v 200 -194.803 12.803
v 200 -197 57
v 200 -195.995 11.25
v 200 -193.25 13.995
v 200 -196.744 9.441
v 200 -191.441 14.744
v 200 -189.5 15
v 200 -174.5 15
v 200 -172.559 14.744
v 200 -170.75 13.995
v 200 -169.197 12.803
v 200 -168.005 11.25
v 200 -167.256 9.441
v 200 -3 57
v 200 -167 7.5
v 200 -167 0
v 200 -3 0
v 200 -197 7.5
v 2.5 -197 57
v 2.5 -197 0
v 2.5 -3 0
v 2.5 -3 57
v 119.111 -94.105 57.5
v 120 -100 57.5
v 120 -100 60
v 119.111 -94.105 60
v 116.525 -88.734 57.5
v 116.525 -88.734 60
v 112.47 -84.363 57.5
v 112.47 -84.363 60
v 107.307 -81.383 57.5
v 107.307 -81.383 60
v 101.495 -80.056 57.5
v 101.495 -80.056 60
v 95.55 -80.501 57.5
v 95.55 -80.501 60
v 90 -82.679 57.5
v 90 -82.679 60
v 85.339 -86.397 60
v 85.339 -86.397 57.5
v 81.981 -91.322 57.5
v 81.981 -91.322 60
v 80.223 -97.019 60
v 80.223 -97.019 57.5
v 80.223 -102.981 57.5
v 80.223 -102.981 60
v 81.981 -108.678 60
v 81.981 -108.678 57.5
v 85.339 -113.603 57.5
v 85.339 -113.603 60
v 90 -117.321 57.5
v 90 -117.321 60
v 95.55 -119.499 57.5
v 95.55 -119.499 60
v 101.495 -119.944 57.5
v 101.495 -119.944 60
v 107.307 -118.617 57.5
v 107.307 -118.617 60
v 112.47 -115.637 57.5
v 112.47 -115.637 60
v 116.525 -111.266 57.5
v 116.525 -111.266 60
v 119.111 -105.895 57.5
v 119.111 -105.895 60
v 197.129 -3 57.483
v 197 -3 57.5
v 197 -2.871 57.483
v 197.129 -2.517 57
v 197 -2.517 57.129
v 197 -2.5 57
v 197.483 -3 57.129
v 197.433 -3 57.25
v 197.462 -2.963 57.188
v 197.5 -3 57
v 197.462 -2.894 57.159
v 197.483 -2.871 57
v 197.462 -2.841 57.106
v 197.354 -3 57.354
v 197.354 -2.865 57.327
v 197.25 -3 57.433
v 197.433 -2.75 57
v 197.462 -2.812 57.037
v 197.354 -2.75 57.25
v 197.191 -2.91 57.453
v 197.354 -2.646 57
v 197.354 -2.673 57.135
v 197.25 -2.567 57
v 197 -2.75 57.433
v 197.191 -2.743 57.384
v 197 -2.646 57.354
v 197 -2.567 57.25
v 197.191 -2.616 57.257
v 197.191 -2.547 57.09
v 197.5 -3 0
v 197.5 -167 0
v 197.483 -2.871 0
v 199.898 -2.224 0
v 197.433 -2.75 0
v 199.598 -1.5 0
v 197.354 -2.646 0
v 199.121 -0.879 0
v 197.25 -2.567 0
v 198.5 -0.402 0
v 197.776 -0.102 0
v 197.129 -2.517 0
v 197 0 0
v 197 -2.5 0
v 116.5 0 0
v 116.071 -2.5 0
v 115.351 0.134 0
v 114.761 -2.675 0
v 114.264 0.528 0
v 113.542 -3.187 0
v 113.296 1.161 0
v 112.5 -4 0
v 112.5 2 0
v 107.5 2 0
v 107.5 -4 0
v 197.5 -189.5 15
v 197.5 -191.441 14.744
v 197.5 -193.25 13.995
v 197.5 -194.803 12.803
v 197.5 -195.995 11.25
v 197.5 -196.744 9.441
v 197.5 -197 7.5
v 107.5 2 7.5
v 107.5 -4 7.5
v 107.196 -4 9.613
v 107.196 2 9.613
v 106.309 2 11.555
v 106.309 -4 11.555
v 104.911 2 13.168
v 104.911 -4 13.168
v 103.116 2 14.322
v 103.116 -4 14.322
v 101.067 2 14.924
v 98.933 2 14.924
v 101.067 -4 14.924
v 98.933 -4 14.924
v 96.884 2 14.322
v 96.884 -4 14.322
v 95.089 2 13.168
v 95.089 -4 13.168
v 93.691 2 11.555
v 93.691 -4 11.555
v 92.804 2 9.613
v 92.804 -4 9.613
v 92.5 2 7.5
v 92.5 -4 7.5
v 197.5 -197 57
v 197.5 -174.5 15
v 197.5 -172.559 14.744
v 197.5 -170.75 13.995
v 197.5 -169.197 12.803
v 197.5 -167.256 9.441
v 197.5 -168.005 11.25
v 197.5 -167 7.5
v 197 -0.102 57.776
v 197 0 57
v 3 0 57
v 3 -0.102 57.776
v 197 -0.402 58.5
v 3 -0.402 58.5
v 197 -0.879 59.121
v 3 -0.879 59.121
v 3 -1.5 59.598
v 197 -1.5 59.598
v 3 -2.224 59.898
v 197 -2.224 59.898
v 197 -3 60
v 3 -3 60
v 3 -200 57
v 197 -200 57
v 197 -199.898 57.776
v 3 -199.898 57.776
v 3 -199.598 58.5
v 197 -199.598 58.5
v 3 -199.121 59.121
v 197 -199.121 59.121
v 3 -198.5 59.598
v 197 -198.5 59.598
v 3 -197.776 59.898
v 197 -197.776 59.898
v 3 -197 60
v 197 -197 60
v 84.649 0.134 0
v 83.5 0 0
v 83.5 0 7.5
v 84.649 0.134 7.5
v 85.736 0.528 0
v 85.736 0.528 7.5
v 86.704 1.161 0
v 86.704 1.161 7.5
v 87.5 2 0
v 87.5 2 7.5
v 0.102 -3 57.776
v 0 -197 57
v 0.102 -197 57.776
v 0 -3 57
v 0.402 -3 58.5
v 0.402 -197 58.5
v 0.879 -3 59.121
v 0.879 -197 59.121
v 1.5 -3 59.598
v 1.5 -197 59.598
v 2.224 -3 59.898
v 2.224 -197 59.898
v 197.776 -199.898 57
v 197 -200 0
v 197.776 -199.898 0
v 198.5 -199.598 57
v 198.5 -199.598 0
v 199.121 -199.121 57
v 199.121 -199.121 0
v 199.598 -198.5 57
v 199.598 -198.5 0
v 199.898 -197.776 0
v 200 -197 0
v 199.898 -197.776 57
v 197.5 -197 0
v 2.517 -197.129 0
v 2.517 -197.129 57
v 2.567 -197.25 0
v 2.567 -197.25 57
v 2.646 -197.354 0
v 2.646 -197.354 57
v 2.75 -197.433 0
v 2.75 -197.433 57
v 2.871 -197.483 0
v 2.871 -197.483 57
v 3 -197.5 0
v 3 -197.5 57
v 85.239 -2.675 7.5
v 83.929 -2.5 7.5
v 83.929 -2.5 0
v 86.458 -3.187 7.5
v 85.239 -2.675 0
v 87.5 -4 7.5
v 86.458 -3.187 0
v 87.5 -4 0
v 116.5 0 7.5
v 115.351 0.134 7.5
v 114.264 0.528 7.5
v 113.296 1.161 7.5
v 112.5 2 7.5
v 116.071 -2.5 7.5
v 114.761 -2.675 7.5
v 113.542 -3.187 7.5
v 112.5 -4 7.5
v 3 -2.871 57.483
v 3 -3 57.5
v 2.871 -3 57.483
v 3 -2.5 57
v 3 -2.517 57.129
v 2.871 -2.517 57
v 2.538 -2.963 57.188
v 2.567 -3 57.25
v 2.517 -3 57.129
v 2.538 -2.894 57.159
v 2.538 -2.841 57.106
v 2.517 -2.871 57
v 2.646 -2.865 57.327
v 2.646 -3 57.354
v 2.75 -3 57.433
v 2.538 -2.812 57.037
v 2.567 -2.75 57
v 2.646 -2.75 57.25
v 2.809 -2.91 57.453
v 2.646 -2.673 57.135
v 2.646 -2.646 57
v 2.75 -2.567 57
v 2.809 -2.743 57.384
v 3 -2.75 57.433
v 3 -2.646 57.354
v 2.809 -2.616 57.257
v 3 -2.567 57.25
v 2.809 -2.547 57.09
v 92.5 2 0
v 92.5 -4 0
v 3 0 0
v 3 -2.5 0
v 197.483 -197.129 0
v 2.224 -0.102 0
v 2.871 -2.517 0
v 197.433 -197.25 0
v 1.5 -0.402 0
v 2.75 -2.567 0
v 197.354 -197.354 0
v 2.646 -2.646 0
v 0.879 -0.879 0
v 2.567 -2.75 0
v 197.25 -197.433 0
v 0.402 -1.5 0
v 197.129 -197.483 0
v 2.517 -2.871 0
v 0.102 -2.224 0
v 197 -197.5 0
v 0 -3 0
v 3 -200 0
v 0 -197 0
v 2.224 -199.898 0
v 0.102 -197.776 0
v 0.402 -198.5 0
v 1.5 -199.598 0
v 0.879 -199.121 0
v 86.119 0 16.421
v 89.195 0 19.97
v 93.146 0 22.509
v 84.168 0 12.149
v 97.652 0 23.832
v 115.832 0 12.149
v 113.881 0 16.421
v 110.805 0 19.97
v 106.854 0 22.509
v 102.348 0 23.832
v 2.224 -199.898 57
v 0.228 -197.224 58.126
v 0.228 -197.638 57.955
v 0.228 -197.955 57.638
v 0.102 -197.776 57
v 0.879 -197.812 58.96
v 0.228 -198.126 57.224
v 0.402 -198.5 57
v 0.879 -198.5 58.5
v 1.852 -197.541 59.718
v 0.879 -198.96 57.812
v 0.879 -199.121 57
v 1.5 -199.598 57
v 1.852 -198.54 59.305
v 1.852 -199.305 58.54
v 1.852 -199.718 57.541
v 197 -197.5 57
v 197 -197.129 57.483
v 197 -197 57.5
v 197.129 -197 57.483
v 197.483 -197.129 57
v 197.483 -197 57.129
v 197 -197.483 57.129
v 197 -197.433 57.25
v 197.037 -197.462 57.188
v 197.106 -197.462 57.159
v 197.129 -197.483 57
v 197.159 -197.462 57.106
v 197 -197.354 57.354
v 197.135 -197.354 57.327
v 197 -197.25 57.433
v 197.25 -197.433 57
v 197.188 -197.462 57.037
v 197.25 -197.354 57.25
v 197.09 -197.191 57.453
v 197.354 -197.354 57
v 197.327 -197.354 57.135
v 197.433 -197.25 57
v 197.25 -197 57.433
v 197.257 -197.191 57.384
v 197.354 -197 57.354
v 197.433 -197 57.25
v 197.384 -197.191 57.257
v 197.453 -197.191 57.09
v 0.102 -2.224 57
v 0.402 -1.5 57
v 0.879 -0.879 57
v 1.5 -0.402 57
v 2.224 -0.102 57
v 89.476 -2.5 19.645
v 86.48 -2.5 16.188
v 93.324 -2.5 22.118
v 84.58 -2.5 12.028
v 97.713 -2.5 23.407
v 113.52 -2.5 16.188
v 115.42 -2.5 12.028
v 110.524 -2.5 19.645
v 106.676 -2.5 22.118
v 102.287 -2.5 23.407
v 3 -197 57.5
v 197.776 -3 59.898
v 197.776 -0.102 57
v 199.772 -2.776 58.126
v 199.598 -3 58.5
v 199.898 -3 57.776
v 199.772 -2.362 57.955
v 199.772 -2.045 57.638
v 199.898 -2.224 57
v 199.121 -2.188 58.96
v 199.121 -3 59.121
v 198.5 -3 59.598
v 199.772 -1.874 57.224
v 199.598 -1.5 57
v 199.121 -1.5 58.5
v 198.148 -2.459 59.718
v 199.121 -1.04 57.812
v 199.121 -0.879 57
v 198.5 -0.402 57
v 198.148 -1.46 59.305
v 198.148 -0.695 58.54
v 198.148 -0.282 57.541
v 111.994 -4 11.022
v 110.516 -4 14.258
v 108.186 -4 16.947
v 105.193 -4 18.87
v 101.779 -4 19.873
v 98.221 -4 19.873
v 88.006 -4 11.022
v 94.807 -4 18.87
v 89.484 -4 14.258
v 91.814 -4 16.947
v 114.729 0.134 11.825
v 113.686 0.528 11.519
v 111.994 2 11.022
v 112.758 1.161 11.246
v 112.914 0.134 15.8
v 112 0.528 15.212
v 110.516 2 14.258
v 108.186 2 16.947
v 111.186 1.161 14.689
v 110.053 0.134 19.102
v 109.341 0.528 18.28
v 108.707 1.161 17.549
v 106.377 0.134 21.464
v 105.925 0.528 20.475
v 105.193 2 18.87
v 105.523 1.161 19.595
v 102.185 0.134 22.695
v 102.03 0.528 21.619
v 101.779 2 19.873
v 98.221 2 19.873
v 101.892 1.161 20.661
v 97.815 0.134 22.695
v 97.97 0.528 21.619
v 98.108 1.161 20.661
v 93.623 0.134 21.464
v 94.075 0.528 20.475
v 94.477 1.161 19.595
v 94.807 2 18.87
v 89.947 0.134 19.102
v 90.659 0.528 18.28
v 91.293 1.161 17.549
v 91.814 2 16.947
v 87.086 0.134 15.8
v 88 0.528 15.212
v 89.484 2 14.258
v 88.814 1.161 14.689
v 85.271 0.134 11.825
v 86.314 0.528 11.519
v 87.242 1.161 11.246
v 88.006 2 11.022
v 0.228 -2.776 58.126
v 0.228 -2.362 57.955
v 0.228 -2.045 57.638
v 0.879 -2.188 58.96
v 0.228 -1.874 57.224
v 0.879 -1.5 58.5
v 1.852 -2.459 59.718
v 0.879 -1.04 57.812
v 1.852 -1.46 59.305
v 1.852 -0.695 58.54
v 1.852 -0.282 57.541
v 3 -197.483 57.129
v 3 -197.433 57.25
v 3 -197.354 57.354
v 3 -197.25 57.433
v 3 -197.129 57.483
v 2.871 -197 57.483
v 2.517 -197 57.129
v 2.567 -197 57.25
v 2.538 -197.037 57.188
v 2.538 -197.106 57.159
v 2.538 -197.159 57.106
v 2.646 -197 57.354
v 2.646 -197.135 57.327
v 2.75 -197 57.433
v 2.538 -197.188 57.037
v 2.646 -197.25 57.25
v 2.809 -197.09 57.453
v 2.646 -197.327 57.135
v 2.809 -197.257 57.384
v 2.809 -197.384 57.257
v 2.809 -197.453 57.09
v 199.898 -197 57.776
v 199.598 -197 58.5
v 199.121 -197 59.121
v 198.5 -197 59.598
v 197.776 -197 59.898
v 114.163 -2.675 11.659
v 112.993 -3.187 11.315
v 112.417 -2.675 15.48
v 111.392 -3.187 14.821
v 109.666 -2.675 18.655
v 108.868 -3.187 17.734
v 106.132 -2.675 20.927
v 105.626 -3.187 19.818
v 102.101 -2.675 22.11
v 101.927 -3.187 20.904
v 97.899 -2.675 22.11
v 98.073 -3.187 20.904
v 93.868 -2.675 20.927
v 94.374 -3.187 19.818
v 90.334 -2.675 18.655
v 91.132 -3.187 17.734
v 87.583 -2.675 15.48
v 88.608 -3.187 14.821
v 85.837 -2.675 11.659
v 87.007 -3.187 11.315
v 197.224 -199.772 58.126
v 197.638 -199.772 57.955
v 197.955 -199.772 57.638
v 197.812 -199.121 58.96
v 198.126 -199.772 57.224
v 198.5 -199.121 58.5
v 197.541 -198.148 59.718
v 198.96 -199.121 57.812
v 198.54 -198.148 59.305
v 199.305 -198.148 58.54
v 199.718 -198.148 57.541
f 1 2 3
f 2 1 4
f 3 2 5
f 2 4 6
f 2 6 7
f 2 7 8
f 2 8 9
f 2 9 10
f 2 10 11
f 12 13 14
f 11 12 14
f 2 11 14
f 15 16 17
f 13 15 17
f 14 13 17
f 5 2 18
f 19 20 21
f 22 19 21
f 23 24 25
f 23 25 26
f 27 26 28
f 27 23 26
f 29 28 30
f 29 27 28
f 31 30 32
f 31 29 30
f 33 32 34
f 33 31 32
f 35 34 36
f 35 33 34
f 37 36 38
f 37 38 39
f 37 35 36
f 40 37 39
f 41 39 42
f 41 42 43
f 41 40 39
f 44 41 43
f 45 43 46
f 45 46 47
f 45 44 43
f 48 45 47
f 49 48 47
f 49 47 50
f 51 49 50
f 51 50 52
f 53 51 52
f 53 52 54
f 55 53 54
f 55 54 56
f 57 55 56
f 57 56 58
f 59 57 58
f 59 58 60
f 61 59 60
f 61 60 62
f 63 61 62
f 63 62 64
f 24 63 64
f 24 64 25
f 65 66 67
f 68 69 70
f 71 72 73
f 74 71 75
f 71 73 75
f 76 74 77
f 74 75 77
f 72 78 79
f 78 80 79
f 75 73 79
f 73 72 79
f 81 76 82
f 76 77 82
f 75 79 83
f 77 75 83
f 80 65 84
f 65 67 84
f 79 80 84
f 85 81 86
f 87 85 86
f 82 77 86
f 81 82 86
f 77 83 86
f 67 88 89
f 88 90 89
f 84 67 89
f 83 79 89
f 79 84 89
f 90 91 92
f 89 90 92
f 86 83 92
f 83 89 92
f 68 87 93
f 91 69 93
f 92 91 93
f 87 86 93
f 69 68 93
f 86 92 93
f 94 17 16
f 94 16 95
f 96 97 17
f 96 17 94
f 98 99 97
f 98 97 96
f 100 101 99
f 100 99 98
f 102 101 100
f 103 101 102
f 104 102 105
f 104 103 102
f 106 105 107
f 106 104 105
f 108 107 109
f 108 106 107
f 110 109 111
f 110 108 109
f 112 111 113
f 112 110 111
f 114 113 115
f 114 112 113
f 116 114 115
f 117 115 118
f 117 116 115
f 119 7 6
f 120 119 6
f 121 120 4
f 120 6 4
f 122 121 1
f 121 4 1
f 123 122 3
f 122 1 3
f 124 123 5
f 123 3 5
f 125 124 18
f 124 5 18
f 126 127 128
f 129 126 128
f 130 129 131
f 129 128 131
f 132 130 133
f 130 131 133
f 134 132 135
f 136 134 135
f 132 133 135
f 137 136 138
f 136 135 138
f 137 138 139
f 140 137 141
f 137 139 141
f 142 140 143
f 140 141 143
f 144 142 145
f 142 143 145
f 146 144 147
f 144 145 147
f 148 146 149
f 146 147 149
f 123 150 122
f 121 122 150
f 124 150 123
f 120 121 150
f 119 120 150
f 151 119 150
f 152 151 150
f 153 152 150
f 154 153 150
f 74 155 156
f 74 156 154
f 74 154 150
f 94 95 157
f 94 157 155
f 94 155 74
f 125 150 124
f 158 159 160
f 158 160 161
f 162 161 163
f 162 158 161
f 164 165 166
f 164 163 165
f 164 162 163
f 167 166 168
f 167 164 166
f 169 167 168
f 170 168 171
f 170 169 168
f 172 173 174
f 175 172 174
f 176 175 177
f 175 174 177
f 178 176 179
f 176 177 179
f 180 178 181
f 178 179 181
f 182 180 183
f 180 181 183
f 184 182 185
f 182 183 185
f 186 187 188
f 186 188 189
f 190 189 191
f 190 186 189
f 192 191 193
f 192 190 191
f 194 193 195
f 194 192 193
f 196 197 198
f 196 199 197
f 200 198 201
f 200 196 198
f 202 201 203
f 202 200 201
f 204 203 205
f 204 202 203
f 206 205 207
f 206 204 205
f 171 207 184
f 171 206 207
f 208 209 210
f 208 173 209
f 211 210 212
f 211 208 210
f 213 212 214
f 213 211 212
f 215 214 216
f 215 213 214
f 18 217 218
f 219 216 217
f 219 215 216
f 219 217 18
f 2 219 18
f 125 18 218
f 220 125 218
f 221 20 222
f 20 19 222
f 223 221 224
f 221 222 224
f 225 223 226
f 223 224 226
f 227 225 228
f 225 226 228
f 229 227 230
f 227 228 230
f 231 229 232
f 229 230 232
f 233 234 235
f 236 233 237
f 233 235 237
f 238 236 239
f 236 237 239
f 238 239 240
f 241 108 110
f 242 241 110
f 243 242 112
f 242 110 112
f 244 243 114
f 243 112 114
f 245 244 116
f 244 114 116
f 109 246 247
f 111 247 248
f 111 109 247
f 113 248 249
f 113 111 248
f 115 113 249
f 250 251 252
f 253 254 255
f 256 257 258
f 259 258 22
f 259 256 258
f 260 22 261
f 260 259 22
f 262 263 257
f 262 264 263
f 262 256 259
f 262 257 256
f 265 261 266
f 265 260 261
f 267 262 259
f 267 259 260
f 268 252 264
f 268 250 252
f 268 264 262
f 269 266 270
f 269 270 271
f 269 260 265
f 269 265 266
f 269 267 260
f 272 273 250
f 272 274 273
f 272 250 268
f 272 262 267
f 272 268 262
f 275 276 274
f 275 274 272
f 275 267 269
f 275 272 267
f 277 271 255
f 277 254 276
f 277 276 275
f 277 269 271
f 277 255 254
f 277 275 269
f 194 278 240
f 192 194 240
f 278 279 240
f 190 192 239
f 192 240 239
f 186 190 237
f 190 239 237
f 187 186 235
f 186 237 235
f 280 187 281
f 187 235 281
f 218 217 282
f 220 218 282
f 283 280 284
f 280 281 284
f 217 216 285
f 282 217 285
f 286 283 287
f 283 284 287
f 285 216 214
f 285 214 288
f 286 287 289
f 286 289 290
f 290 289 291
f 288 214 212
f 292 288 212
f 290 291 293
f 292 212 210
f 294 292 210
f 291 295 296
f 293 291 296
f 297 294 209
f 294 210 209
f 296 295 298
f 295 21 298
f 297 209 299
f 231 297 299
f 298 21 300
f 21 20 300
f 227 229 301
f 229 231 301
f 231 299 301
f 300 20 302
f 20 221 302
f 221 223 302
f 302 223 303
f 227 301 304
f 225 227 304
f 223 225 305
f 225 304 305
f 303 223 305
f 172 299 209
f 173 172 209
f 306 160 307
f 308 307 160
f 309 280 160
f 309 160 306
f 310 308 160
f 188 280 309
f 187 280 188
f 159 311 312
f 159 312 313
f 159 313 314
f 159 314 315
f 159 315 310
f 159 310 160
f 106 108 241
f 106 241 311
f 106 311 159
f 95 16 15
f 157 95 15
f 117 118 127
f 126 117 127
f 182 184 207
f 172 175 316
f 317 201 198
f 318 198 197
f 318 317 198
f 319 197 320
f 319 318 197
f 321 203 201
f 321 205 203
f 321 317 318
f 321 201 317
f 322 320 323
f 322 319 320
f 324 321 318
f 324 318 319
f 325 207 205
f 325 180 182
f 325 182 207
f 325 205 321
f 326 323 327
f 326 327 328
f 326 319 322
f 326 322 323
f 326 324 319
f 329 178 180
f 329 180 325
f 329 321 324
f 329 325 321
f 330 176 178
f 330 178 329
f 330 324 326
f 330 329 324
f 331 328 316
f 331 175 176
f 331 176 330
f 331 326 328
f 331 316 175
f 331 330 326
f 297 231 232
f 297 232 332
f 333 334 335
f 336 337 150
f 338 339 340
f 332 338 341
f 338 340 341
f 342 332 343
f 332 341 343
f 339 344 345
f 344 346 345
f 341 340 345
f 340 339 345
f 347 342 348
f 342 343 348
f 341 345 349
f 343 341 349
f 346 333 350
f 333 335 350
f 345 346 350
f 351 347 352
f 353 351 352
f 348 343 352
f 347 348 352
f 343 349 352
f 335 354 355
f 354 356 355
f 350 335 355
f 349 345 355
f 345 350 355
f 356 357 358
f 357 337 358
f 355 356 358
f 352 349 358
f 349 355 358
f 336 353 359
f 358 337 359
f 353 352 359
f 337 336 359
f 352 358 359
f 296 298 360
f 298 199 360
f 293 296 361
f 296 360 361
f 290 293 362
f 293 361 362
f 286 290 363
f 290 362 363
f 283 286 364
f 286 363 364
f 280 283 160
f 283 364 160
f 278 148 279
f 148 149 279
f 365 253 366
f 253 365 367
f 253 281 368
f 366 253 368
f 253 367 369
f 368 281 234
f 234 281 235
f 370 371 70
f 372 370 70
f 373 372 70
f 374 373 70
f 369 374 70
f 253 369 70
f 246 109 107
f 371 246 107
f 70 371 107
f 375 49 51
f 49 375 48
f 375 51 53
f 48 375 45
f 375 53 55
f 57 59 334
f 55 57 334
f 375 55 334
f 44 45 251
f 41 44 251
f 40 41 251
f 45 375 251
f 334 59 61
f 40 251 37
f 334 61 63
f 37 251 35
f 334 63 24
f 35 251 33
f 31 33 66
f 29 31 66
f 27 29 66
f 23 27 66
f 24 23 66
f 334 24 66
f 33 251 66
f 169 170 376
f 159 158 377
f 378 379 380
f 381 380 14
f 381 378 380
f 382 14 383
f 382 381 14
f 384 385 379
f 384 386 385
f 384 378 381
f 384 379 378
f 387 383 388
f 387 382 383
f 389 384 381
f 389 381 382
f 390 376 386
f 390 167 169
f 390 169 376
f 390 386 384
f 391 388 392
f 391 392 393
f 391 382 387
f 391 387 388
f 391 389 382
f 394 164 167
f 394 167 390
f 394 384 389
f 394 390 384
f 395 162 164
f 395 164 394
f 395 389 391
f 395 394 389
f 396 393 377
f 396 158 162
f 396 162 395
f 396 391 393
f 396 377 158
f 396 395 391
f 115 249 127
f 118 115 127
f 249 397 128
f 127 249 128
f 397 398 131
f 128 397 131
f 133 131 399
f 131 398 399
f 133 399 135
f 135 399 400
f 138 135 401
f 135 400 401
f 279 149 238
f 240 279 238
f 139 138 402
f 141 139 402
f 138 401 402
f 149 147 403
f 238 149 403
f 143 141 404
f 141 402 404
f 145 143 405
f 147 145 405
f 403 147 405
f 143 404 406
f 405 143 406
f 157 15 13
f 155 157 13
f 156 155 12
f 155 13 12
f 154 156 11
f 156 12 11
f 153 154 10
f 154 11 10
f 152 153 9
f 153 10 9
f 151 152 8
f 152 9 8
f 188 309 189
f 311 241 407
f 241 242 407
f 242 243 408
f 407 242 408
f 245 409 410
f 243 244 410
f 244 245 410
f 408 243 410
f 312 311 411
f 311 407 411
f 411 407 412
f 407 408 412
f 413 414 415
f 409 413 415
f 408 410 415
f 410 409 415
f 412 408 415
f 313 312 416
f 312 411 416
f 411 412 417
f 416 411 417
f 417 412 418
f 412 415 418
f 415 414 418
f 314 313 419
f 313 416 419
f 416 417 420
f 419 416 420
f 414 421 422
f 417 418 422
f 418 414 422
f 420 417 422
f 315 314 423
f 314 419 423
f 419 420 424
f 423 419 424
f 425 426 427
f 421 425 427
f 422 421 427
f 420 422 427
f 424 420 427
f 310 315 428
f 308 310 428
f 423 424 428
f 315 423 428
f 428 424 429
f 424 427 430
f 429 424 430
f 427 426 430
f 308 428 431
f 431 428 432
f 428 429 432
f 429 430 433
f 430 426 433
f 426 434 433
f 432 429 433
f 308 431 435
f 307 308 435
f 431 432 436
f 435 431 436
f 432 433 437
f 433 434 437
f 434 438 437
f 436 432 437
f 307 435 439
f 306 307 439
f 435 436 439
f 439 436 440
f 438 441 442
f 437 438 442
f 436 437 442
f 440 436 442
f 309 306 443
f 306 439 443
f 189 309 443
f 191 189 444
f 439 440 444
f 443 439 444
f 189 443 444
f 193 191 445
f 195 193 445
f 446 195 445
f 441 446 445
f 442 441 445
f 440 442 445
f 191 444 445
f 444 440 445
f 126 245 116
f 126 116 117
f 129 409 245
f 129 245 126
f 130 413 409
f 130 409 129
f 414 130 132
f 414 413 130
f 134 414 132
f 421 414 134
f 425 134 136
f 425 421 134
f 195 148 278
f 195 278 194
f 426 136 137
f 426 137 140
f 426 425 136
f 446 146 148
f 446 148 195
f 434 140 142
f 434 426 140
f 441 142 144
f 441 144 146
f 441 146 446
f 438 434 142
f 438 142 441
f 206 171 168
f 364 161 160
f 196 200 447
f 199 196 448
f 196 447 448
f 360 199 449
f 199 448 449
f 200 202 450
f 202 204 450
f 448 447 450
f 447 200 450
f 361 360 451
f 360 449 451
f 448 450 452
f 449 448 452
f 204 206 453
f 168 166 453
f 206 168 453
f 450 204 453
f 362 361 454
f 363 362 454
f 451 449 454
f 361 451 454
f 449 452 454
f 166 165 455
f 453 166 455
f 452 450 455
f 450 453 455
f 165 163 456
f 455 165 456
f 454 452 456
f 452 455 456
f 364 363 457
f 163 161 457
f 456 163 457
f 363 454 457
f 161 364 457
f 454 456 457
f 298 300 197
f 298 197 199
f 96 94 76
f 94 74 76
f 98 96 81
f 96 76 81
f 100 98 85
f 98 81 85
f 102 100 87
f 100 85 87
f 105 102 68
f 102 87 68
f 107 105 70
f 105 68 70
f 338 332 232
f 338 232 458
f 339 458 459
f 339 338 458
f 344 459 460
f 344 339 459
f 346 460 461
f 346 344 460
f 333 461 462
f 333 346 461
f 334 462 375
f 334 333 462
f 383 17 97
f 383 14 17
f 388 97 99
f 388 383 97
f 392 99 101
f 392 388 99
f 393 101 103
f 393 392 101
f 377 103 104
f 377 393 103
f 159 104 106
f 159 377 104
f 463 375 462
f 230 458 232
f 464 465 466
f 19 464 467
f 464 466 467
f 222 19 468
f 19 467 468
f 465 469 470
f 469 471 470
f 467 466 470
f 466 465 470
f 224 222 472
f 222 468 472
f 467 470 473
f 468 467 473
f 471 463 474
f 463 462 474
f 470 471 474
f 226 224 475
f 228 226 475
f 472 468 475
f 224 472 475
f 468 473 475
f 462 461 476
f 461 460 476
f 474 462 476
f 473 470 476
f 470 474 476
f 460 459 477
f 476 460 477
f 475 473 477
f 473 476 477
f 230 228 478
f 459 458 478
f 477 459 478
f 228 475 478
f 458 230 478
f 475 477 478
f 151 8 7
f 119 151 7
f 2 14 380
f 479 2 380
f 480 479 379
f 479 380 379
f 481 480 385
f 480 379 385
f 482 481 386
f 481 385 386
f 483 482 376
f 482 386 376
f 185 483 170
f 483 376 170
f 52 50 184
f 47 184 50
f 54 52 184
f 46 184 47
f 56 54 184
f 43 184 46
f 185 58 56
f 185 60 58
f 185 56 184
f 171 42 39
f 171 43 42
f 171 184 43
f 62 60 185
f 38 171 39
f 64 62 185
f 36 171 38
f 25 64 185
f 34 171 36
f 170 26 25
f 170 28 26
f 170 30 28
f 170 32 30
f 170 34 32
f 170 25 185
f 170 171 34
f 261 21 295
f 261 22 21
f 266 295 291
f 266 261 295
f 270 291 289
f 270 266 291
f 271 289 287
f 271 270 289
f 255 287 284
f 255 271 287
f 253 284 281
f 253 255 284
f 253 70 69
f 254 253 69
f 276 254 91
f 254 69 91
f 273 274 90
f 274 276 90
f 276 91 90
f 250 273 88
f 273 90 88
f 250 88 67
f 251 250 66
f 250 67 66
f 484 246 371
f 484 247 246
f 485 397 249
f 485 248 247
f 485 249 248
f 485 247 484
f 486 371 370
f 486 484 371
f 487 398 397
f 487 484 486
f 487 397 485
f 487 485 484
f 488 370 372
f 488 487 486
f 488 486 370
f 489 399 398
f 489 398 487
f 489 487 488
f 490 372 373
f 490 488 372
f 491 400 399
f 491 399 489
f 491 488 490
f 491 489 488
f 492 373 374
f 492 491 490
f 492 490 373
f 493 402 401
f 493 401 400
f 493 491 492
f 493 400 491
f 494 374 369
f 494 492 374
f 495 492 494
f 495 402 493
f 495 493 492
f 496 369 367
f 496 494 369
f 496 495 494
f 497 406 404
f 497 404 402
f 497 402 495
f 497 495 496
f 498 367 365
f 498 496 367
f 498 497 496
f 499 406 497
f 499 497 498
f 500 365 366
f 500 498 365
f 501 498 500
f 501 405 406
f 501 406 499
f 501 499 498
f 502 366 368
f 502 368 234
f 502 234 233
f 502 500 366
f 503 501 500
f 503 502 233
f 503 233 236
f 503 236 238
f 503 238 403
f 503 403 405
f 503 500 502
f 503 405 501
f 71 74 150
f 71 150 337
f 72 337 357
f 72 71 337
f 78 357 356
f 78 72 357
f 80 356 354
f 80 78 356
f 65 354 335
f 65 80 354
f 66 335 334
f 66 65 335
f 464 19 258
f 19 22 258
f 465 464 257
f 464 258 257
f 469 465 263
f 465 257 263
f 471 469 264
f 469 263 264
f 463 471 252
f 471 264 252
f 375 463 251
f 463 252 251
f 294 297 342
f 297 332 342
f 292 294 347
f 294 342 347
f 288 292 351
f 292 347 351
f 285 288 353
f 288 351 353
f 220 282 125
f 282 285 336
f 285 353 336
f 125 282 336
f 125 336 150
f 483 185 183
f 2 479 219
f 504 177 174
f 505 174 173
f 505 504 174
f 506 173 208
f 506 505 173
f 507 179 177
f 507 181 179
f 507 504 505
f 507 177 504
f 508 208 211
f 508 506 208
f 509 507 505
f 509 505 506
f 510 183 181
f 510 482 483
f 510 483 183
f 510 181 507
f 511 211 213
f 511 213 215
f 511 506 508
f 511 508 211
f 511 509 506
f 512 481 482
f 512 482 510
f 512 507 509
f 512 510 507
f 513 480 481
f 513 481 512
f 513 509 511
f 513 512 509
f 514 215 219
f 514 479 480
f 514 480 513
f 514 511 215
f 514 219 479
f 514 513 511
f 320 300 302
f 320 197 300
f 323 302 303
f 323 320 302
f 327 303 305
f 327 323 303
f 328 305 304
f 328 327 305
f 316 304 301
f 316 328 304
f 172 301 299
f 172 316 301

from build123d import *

# Parameters (mm, degrees)
F0_W          = 200
F0_H          = 200
F0_R          = 20
F1_DEPTH      = 60
F2_R          = 3
F3_T          = -2.5
F4_DEPTH      = 60
F6_DEPTH      = 25
F8_DEPTH      = 25
F9_DEPTH      = 2
F9_DEPTH_BACK = 4
F10_T1_DEPTH  = 7.5
F10_T4_ANGLE  = 180
F10_T6_ANGLE  = 180


# Not quite as in the source:
# - a fillet or chamfer that OpenCascade refuses, or shapes differently, is made with other operations: its cross-section is extruded or revolved along the edge and cut away or added


with BuildPart() as f1:
    # F0 (on Top) → F1 (new body)
    with BuildSketch(Plane.XY):
        with Locations((100, -100)):
            Rectangle(F0_W, F0_H)
        with Locations((100, -100)):
            Circle(F0_R, mode=Mode.SUBTRACT)
        with Locations((100, -100)):
            Circle(F0_R)
    extrude(amount=F1_DEPTH)

    # F2
    f2_edges = [f1.edges().sort_by_distance(p)[0] for p in [
        (100, 0, 60),
        (200, -100, 60),
        (100, -200, 60),
        (0, -100, 60),
        (0, 0, 30),
        (0, -200, 30),
        (200, -200, 30),
        (200, 0, 30),
    ]]
    fillet(f2_edges, radius=F2_R)

    # F3
    f3_openings = [f1.faces().sort_by_distance(p)[0] for p in [
        (100, -100, 0),
    ]]
    offset(amount=F3_T, openings=f3_openings)

    # F0 (on Top) → F4 (cut, through all)
    with BuildSketch(Plane.XY):
        with Locations((100, -100)):
            Circle(F0_R)
    extrude(amount=F4_DEPTH, mode=Mode.SUBTRACT)

    # F5 (on face) → F6 (cut)
    with BuildSketch(Plane.YZ.offset(200)):
        with BuildLine():
            Line((-197, 7.5), (-197, 0))
            Line((-197, 0), (-167, 0))
            Line((-167, 0), (-167, 7.5))
            ThreePointArc((-167, 7.5), (-169.1966991411, 12.8033008589), (-174.5, 15))
            Line((-174.5, 15), (-189.5, 15))
            ThreePointArc((-189.5, 15), (-194.8033008589, 12.8033008589), (-197, 7.5))
        make_face()
    extrude(amount=-F6_DEPTH, mode=Mode.SUBTRACT)

    # F7 (on face) → F8 (cut)
    with BuildSketch(Plane(origin=(0, 0, 0), x_dir=(-1, 0, 0), z_dir=(0, 1, 0))):
        with BuildLine():
            Line((-92.5, 0), (-92.5, 7.5))
            ThreePointArc((-92.5, 7.5), (-100, 15), (-107.5, 7.5))
            Line((-107.5, 7.5), (-107.5, 0))
            Line((-107.5, 0), (-92.5, 0))
        make_face()
    extrude(amount=-F8_DEPTH, mode=Mode.SUBTRACT)

    # F7 (on face) → F9 (join, two sides)
    with BuildSketch(Plane(origin=(0, 0, 0), x_dir=(-1, 0, 0), z_dir=(0, 1, 0))) as f9_sk:
        with BuildLine():
            ThreePointArc((-107.5, 7.5), (-100, 15), (-92.5, 7.5))
            Line((-92.5, 7.5), (-92.5, 0))
            Line((-92.5, 0), (-87.5, 0))
            Line((-87.5, 0), (-87.5, 7.5))
            ThreePointArc((-87.5, 7.5), (-100, 20), (-112.5, 7.5))
            Line((-112.5, 7.5), (-112.5, 0))
            Line((-112.5, 0), (-107.5, 0))
            Line((-107.5, 0), (-107.5, 7.5))
        make_face()
    extrude(amount=F9_DEPTH)
    extrude(f9_sk.sketch, amount=-F9_DEPTH_BACK)

    # F10: fillet of radius 5 on 2 edges, made by hand

    # F10_s2 → F10_t1 (join)
    with BuildSketch(Plane.XY):
        with BuildLine():
            ThreePointArc((116.0707142143, -2.5), (114.1342225412, -2.8902277714), (112.5, -4))
            Line((112.5, -4), (112.5, -2.5))
            Line((112.5, -2.5), (116.0707142143, -2.5))
        make_face()
        with BuildLine():
            ThreePointArc((83.9292857857, -2.5), (85.8657774588, -2.8902277714), (87.5, -4))
            Line((87.5, -4), (87.5, -2.5))
            Line((87.5, -2.5), (83.9292857857, -2.5))
        make_face()
        with BuildLine():
            ThreePointArc((116.5, 0), (114.2639320225, 0.527864045), (112.5, 2))
            Line((112.5, 2), (112.5, 0))
            Line((112.5, 0), (116.5, 0))
        make_face()
        with BuildLine():
            ThreePointArc((83.5, 0), (85.7360679775, 0.527864045), (87.5, 2))
            Line((87.5, 2), (87.5, 0))
            Line((87.5, 0), (83.5, 0))
        make_face()
    extrude(amount=F10_T1_DEPTH)

    # F10_s3 → F10_t4 (revolve)
    with BuildSketch(Plane.XY.offset(7.5)):
        with BuildLine():
            ThreePointArc((116.5, 0), (114.2639320225, 0.527864045), (112.5, 2))
            Line((112.5, 2), (112.5, 0))
            Line((112.5, 0), (116.5, 0))
        make_face()
    revolve(axis=Axis((100, 0, 7.5), (0, -1, 0)), revolution_arc=F10_T4_ANGLE)

    # F10_s5 → F10_t6 (revolve)
    with BuildSketch(Plane.XY.offset(7.5)):
        with BuildLine():
            ThreePointArc((116.0707142143, -2.5), (114.1342225412, -2.8902277714), (112.5, -4))
            Line((112.5, -4), (112.5, -2.5))
            Line((112.5, -2.5), (116.0707142143, -2.5))
        make_face()
    revolve(axis=Axis((100, -2.5, 7.5), (0, -1, 0)), revolution_arc=F10_T6_ANGLE)


solid = f1.part
